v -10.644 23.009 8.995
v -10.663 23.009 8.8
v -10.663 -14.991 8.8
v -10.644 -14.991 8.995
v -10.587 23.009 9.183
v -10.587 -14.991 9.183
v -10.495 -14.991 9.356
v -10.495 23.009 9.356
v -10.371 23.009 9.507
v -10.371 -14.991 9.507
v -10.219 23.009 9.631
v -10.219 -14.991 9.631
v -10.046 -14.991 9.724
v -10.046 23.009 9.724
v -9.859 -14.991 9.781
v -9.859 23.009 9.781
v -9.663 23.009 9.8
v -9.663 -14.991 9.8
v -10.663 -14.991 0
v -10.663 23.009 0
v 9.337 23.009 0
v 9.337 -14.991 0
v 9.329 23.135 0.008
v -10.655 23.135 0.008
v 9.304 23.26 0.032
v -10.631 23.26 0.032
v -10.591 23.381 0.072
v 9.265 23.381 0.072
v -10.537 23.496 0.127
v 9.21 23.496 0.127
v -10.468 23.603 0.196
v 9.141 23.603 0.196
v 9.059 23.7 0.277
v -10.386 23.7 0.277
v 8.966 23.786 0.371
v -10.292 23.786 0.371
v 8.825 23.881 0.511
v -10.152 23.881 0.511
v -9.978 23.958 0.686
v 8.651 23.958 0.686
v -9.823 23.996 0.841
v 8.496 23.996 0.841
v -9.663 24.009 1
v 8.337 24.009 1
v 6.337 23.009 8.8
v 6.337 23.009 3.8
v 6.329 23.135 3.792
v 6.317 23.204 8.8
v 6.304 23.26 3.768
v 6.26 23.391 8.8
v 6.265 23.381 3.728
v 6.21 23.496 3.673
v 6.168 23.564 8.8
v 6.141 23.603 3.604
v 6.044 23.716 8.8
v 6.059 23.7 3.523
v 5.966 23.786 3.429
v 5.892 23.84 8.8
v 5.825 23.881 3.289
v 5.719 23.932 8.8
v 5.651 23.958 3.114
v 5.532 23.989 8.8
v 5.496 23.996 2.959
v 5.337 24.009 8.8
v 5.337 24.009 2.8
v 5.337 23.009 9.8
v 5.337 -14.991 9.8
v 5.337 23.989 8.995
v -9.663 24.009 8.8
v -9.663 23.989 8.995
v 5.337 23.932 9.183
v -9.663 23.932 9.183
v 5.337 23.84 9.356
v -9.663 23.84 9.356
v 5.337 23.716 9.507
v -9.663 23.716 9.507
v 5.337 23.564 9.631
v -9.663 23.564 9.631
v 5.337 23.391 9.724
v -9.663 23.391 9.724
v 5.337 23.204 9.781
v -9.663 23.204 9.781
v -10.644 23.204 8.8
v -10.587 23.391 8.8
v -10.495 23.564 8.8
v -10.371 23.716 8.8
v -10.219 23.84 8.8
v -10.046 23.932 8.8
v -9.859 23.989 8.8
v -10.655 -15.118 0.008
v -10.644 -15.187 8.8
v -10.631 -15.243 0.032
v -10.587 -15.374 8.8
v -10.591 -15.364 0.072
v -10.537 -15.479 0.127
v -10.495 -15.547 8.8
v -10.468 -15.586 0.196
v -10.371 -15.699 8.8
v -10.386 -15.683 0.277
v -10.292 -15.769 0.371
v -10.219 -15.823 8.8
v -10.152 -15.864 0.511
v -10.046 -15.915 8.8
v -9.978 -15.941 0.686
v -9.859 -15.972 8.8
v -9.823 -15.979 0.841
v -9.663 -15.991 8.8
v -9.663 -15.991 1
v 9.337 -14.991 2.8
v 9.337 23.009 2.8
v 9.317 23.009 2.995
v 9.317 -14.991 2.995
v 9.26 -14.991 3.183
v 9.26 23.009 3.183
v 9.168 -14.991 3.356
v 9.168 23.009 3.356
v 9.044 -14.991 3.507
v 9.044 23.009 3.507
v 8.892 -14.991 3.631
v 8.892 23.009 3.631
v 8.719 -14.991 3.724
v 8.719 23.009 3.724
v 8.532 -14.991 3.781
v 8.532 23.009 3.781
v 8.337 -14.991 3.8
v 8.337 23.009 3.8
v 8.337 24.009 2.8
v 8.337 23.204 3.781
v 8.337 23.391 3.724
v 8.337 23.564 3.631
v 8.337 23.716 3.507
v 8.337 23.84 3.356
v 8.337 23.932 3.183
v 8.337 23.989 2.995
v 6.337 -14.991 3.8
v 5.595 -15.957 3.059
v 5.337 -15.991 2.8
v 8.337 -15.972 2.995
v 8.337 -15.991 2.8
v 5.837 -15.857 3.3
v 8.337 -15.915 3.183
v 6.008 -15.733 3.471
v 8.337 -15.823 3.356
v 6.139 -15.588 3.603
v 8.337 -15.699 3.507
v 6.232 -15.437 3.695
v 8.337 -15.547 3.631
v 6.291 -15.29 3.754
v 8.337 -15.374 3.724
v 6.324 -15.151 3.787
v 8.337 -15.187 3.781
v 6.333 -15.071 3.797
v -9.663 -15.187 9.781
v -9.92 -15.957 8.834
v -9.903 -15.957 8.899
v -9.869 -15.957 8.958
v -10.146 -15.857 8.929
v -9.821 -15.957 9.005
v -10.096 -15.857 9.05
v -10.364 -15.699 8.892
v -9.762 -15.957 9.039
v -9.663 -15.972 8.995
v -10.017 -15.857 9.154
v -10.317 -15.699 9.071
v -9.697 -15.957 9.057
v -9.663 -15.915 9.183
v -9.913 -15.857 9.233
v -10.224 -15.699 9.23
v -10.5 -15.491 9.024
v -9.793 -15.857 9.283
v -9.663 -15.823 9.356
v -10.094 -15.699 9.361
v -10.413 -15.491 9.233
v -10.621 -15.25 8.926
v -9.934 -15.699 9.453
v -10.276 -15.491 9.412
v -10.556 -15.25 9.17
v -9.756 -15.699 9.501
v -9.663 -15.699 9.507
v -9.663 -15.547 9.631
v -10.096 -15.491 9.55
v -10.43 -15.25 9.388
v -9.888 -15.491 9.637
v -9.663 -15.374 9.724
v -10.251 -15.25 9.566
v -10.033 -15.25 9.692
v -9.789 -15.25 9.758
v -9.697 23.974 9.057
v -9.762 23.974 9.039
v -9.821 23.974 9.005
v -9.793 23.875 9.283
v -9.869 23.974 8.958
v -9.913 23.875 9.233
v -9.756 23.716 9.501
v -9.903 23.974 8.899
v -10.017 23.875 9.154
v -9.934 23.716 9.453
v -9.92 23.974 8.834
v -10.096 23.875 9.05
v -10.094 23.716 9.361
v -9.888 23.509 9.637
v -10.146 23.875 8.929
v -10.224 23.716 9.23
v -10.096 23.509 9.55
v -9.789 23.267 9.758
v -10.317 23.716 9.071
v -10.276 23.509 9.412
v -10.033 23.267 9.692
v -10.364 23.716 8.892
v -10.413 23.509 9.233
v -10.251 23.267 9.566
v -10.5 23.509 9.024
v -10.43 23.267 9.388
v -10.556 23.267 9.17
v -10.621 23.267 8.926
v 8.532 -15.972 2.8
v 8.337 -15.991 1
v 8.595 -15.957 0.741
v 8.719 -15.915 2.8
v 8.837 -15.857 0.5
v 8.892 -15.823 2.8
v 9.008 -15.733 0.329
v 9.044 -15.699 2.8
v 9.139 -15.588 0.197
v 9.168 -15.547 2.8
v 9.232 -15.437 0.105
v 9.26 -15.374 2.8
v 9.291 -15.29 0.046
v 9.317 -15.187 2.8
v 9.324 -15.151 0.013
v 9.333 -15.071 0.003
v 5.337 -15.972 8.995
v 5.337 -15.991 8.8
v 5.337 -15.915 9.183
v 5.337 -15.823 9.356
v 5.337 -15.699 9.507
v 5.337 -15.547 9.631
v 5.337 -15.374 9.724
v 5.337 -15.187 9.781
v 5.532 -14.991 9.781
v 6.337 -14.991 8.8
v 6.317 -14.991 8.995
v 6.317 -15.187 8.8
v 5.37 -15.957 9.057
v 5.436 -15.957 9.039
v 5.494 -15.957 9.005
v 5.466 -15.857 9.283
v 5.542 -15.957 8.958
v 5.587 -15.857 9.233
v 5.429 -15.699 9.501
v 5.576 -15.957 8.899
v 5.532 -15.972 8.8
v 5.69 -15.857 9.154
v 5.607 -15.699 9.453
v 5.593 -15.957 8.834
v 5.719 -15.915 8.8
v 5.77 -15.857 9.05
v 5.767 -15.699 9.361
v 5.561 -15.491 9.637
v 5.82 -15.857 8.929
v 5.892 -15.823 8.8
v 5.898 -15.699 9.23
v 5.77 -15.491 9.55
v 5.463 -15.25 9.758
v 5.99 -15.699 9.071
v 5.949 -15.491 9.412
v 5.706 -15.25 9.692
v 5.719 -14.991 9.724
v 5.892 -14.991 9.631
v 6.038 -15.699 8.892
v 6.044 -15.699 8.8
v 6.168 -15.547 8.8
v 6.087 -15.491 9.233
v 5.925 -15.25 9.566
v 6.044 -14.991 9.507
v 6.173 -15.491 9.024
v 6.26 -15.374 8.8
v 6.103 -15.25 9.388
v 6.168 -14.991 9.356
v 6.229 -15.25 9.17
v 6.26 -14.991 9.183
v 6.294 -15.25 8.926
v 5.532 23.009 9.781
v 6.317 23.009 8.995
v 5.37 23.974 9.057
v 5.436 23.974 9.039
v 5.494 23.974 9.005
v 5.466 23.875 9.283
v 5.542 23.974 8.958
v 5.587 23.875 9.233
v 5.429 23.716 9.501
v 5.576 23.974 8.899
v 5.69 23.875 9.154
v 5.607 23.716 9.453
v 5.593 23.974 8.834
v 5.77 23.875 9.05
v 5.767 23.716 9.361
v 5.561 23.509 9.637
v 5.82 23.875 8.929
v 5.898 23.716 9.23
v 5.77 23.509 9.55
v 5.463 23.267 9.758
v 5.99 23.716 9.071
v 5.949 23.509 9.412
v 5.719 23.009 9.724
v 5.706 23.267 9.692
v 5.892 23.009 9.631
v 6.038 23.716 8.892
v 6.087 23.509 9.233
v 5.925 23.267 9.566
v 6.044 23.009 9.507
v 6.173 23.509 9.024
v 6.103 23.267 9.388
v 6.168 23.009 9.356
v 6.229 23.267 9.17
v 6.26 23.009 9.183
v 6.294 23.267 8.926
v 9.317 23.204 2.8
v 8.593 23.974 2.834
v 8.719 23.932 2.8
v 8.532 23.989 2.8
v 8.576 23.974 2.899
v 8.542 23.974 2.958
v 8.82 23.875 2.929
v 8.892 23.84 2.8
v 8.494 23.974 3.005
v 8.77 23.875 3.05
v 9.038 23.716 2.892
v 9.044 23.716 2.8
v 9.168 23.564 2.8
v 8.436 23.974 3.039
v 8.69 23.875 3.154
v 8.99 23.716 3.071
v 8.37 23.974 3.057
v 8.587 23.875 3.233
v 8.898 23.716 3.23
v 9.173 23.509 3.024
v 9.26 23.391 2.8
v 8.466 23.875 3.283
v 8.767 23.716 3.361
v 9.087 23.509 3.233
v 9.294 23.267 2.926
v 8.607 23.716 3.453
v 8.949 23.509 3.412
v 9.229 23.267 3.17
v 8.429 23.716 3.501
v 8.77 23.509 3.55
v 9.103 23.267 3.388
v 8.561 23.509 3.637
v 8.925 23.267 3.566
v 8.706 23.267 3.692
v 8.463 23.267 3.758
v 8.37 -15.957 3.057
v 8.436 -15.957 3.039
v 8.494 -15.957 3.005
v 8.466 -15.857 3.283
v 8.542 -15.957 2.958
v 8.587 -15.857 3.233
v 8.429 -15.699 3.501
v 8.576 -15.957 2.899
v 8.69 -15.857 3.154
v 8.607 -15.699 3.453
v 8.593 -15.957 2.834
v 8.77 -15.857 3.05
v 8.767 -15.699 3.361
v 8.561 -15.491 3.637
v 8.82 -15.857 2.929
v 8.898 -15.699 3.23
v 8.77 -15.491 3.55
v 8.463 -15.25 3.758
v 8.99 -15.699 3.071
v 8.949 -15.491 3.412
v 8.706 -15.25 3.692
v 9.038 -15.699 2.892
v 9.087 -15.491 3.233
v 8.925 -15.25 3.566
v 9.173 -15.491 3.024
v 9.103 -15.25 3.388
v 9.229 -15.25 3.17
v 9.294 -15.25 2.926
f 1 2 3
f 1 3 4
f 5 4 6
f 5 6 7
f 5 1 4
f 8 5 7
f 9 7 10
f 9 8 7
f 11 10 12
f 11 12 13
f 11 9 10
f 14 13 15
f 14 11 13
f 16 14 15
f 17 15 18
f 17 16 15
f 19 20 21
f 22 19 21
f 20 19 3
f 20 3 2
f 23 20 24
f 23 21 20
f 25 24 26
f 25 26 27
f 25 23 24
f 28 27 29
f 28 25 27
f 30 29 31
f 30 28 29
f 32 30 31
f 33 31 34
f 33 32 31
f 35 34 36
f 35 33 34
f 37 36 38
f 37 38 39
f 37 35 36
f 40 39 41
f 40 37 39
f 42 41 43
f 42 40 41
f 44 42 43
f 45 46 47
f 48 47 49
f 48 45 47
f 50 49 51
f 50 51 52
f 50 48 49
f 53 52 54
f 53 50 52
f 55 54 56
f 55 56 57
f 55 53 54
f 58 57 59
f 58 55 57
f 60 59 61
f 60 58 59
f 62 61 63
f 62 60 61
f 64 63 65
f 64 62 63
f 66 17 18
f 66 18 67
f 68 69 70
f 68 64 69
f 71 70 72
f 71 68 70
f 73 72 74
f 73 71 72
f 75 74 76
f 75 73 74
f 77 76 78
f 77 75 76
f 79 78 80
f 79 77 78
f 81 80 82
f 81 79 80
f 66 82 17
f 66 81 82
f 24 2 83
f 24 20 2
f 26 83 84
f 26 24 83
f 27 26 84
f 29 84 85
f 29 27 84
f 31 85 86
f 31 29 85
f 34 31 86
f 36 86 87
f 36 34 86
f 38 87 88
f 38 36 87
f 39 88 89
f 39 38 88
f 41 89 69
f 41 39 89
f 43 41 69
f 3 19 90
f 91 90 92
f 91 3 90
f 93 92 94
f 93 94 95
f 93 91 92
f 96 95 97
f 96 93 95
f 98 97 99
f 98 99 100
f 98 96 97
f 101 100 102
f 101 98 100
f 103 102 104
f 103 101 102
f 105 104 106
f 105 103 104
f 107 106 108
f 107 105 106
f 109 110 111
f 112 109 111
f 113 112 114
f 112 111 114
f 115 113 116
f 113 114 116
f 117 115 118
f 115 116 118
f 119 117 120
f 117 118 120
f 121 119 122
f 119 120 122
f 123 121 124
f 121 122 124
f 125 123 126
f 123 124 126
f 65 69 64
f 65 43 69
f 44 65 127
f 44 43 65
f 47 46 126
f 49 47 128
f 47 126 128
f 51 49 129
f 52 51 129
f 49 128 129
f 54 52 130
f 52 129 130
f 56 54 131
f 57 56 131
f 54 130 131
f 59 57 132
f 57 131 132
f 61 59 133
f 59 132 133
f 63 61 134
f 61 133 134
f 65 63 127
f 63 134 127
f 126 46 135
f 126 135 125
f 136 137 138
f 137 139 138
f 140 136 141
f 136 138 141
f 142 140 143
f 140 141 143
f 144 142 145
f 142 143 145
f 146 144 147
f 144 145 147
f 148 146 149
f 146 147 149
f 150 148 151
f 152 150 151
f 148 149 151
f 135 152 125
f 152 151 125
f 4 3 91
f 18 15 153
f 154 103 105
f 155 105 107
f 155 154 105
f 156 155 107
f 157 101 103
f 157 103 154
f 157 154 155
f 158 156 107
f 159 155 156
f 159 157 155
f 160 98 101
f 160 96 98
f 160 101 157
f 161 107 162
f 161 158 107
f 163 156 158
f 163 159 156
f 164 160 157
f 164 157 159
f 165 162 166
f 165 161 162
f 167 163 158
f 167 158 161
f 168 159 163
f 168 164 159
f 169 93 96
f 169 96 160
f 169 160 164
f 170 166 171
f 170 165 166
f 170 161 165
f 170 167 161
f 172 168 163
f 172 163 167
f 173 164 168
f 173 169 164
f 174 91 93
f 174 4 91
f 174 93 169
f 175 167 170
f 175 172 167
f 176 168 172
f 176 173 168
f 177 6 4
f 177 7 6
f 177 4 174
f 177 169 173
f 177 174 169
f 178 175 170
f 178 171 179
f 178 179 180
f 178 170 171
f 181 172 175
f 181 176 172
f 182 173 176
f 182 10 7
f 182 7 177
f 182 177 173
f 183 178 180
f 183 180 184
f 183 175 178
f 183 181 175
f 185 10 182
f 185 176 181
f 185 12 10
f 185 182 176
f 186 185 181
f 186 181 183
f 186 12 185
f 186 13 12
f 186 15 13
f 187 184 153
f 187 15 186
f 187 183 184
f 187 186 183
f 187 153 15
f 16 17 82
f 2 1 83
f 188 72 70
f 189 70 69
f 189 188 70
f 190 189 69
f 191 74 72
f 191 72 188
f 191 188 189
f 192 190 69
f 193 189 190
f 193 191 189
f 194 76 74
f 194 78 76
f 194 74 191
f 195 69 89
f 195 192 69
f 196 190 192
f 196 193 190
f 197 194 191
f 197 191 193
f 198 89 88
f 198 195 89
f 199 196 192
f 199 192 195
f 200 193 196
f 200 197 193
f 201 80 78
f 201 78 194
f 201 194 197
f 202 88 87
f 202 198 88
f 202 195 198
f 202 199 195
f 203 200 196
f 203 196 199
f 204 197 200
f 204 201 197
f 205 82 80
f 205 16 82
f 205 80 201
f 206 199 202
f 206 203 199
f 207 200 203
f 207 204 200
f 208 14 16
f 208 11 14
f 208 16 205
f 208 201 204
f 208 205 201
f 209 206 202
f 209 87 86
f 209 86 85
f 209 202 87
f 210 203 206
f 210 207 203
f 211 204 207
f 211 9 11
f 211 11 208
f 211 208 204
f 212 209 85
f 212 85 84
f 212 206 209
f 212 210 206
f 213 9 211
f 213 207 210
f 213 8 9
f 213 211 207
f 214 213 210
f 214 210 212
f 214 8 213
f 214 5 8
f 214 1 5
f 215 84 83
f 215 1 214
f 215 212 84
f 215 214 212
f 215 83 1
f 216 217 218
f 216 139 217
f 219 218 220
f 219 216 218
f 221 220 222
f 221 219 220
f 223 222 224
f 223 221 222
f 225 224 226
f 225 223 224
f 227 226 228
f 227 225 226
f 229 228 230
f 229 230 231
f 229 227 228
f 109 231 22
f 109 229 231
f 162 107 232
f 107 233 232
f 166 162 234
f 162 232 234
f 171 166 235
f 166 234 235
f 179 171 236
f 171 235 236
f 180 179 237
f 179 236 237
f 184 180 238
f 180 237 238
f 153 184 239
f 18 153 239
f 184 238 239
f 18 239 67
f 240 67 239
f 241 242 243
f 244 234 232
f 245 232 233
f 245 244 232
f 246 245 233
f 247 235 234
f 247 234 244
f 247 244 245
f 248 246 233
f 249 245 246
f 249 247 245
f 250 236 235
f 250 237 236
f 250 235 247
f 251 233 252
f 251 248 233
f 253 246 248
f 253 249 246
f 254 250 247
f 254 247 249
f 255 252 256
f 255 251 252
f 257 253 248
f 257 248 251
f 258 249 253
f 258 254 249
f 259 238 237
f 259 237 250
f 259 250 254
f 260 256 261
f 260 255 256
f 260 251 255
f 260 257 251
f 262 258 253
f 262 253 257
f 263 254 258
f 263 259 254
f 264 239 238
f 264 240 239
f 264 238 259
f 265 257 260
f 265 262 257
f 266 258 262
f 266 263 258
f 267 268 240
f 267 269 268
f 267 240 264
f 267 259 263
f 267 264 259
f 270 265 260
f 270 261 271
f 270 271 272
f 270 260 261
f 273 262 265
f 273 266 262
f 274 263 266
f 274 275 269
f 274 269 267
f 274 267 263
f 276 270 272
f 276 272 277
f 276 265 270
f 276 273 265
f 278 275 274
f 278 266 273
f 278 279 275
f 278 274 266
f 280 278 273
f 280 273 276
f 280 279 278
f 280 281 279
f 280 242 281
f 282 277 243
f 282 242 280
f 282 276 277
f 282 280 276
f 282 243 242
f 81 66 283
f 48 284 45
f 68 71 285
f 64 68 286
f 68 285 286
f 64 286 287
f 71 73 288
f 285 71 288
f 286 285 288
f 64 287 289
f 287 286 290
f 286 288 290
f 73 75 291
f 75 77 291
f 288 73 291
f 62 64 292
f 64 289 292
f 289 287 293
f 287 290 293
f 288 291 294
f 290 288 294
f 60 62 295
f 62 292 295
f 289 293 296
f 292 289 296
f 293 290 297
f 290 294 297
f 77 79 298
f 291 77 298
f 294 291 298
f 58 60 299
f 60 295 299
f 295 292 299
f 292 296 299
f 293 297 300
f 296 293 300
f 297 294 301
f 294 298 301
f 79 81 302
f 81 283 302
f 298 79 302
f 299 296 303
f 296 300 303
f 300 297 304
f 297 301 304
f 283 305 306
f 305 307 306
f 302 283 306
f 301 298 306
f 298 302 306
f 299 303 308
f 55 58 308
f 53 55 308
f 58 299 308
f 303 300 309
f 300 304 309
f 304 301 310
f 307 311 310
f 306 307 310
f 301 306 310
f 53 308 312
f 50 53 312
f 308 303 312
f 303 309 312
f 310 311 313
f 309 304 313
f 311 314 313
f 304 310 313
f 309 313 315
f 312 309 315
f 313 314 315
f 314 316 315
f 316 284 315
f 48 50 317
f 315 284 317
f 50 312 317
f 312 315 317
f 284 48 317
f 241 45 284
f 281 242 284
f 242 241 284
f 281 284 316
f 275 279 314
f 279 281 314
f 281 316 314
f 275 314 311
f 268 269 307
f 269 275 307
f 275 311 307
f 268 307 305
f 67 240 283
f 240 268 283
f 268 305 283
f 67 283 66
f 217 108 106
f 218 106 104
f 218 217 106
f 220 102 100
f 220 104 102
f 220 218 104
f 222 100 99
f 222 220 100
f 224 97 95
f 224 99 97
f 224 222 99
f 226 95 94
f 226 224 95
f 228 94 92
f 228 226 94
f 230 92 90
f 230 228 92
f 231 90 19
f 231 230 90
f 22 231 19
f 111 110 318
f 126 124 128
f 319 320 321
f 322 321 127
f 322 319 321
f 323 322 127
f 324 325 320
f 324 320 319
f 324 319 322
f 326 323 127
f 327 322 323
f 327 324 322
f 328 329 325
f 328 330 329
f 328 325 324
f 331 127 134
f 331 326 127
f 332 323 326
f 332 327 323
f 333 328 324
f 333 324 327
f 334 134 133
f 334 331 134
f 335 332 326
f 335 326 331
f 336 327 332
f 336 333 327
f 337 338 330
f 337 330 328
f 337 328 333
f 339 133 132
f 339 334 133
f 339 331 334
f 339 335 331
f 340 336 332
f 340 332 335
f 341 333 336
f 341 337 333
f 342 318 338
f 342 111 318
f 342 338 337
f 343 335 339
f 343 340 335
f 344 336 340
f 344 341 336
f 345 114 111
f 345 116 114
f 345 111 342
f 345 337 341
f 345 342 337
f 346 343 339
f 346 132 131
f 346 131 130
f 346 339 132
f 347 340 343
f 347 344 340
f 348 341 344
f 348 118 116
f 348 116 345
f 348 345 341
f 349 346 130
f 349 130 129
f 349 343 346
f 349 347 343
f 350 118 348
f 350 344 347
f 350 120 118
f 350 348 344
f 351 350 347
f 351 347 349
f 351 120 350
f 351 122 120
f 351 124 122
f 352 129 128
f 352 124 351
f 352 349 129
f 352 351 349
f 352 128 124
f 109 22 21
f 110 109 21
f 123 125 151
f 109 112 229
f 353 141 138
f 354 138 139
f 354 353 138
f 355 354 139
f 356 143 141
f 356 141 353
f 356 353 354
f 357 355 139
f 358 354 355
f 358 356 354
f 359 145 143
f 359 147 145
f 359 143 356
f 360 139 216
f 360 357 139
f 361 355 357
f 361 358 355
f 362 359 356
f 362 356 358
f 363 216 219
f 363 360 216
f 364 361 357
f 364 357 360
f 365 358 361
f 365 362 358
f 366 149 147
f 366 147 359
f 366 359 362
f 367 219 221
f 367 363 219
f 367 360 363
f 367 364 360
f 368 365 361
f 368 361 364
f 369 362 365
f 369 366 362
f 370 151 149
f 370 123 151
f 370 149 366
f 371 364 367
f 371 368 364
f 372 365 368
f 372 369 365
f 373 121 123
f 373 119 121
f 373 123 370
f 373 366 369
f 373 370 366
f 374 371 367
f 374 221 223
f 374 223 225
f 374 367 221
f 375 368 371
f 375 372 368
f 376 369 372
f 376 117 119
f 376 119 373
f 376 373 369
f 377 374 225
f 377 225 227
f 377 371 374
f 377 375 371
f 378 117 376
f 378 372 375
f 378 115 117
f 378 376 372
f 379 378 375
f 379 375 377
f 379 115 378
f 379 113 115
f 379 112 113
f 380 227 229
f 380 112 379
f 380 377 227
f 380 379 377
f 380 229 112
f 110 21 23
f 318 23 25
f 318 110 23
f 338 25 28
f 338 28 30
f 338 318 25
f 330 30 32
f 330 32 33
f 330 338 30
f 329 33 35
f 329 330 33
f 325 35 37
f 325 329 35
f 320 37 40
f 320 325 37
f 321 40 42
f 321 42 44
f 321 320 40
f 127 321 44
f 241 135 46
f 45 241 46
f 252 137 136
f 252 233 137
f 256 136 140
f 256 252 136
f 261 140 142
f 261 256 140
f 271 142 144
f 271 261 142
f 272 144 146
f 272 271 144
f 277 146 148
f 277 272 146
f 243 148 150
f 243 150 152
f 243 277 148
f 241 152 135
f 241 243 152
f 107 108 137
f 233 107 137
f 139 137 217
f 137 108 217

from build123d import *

# Parameters (mm, degrees)
F0_W     = 20
F0_H     = 40
F1_DEPTH = 3.8
F2_W     = 17
F2_H     = 40
F3_DEPTH = 6
F4_R     = 1


with BuildPart() as f1:
    # F0 (on Top) → F1 (new body)
    with BuildSketch(Plane.XY):
        with Locations((-0.663412, 4.008531)):
            Rectangle(F0_W, F0_H)
    extrude(amount=F1_DEPTH)

    # F2 (on face) → F3 (join)
    with BuildSketch(Plane.XY.offset(3.8)):
        with Locations((-2.163412, 4.008531)):
            Rectangle(F2_W, F2_H)
    extrude(amount=F3_DEPTH)

    # F4
    f4_edges = [f1.edges().sort_by_distance(p)[0] for p in [
        (6.336588, 4.008531, 9.8),
        (-10.663412, 4.008531, 9.8),
        (9.336588, 4.008531, 3.8),
        (-2.163412, 24.008531, 9.8),
        (9.336588, 24.008531, 1.9),
        (7.836588, 24.008531, 3.8),
        (6.336588, 24.008531, 6.8),
        (-10.663412, 24.008531, 4.9),
        (-0.663412, 24.008531, 0),
        (-10.663412, -15.991469, 4.9),
        (-2.163412, -15.991469, 9.8),
        (6.336588, -15.991469, 6.8),
        (7.836588, -15.991469, 3.8),
        (9.336588, -15.991469, 1.9),
        (-0.663412, -15.991469, 0),
    ]]
    fillet(f4_edges, radius=F4_R)


solid = f1.part
